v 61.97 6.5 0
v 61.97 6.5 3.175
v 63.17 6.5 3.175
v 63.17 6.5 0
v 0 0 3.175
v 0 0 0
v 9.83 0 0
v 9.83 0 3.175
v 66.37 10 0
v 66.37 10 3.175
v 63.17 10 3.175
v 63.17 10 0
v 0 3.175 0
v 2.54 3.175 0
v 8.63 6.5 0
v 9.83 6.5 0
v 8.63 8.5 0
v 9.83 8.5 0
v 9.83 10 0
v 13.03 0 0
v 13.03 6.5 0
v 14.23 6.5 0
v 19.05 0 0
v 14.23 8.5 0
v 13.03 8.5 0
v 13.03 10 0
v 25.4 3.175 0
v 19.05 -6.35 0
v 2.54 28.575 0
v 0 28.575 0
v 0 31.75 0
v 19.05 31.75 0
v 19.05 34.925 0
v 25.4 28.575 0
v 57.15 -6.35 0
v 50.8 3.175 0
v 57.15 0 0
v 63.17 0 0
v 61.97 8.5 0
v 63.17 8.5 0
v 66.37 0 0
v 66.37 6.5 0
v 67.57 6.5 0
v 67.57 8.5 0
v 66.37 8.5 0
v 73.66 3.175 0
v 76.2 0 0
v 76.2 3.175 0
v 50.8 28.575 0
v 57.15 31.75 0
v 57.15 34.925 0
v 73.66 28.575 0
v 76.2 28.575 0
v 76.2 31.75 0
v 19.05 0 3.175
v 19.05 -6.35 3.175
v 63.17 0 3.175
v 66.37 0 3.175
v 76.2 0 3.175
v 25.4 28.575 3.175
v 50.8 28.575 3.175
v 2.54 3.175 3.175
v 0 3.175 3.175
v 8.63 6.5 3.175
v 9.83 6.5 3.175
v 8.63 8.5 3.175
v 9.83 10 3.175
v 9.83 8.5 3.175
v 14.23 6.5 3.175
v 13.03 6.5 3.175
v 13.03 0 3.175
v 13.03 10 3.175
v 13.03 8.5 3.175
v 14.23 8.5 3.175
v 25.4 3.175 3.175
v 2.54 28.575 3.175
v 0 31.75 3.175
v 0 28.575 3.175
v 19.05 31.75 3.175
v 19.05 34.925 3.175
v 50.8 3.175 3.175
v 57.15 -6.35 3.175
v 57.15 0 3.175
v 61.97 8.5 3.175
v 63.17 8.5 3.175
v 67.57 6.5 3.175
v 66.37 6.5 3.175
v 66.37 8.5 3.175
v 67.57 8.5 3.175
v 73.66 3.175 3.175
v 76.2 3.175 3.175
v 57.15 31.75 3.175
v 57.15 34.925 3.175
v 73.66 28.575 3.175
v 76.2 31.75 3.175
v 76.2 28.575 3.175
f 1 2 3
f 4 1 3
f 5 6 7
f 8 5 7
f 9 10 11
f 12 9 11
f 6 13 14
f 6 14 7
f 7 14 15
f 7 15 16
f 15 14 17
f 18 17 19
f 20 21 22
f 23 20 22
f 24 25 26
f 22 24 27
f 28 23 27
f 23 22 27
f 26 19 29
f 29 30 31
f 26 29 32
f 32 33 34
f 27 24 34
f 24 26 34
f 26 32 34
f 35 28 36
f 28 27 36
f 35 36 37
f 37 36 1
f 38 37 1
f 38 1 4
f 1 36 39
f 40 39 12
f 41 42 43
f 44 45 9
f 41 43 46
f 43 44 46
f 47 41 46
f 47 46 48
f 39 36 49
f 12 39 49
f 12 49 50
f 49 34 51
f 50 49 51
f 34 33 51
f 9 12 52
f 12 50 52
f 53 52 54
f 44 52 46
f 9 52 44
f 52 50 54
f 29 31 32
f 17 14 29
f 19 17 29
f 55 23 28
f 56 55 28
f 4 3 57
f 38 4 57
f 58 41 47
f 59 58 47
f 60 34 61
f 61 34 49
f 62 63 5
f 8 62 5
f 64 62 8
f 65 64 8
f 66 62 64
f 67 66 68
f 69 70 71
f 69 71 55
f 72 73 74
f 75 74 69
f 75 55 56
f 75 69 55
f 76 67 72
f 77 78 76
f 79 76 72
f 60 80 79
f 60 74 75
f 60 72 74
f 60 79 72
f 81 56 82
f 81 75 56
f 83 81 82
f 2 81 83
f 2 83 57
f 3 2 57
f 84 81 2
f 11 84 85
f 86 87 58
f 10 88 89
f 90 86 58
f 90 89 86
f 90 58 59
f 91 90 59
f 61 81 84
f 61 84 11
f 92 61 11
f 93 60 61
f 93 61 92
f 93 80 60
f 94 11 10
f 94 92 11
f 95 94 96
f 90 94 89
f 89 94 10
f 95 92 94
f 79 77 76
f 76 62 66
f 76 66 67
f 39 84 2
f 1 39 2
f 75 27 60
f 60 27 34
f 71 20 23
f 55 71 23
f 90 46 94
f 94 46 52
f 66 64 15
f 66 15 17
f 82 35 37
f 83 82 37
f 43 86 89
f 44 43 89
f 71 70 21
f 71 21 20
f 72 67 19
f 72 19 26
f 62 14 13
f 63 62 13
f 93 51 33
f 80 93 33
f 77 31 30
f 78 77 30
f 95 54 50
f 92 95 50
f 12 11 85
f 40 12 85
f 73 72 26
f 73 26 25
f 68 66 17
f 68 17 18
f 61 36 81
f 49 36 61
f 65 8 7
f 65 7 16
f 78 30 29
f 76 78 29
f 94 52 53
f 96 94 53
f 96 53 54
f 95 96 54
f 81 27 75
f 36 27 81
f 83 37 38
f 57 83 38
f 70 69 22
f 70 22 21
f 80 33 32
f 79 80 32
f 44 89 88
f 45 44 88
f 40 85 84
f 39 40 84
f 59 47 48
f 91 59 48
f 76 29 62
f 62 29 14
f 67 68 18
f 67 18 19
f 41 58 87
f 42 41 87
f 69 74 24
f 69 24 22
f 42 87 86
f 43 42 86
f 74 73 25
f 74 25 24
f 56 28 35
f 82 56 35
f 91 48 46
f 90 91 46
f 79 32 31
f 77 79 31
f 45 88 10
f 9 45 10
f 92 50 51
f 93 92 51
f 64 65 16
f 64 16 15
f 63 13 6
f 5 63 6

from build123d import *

# Parameters (mm, degrees)
SKETCH1_W           = 25.4
SKETCH1_H           = 25.4
BOSS_EXTRUDE1_DEPTH = 3.175
CUT_EXTRUDE1_DEPTH  = 4.175


with BuildPart() as part:
    # Sketch1 → Boss-Extrude1 (new body)
    with BuildSketch(Plane.XY):
        Polygon((0, 0), (19.05, 0), (19.05, -6.35), (57.15, -6.35), (57.15, 0), (76.2, 0), (76.2, 3.175), (73.66, 3.175), (73.66, 28.575), (76.2, 28.575), (76.2, 31.75), (57.15, 31.75), (57.15, 34.925), (19.05, 34.925), (19.05, 31.75), (0, 31.75), (0, 28.575), (2.54, 28.575), (2.54, 3.175), (0, 3.175), align=None)
        with Locations((38.1, 15.875)):
            Rectangle(SKETCH1_W, SKETCH1_H, mode=Mode.SUBTRACT)
    extrude(amount=BOSS_EXTRUDE1_DEPTH)

    # Sketch2 → Cut-Extrude1 (cut, through all)
    with BuildSketch(Plane.XY.offset(3.175)):
        Polygon((13.03, 0), (9.83, 0), (9.83, 6.5), (8.63, 6.5), (8.63, 8.5), (9.83, 8.5), (9.83, 10), (13.03, 10), (13.03, 8.5), (14.23, 8.5), (14.23, 6.5), (13.03, 6.5), align=None)
        Polygon((66.37, 8.5), (66.37, 10), (63.17, 10), (63.17, 8.5), (61.97, 8.5), (61.97, 6.5), (63.17, 6.5), (63.17, 0), (66.37, 0), (66.37, 6.5), (67.57, 6.5), (67.57, 8.5), align=None)
    extrude(amount=-CUT_EXTRUDE1_DEPTH, mode=Mode.SUBTRACT)


solid = part.part
